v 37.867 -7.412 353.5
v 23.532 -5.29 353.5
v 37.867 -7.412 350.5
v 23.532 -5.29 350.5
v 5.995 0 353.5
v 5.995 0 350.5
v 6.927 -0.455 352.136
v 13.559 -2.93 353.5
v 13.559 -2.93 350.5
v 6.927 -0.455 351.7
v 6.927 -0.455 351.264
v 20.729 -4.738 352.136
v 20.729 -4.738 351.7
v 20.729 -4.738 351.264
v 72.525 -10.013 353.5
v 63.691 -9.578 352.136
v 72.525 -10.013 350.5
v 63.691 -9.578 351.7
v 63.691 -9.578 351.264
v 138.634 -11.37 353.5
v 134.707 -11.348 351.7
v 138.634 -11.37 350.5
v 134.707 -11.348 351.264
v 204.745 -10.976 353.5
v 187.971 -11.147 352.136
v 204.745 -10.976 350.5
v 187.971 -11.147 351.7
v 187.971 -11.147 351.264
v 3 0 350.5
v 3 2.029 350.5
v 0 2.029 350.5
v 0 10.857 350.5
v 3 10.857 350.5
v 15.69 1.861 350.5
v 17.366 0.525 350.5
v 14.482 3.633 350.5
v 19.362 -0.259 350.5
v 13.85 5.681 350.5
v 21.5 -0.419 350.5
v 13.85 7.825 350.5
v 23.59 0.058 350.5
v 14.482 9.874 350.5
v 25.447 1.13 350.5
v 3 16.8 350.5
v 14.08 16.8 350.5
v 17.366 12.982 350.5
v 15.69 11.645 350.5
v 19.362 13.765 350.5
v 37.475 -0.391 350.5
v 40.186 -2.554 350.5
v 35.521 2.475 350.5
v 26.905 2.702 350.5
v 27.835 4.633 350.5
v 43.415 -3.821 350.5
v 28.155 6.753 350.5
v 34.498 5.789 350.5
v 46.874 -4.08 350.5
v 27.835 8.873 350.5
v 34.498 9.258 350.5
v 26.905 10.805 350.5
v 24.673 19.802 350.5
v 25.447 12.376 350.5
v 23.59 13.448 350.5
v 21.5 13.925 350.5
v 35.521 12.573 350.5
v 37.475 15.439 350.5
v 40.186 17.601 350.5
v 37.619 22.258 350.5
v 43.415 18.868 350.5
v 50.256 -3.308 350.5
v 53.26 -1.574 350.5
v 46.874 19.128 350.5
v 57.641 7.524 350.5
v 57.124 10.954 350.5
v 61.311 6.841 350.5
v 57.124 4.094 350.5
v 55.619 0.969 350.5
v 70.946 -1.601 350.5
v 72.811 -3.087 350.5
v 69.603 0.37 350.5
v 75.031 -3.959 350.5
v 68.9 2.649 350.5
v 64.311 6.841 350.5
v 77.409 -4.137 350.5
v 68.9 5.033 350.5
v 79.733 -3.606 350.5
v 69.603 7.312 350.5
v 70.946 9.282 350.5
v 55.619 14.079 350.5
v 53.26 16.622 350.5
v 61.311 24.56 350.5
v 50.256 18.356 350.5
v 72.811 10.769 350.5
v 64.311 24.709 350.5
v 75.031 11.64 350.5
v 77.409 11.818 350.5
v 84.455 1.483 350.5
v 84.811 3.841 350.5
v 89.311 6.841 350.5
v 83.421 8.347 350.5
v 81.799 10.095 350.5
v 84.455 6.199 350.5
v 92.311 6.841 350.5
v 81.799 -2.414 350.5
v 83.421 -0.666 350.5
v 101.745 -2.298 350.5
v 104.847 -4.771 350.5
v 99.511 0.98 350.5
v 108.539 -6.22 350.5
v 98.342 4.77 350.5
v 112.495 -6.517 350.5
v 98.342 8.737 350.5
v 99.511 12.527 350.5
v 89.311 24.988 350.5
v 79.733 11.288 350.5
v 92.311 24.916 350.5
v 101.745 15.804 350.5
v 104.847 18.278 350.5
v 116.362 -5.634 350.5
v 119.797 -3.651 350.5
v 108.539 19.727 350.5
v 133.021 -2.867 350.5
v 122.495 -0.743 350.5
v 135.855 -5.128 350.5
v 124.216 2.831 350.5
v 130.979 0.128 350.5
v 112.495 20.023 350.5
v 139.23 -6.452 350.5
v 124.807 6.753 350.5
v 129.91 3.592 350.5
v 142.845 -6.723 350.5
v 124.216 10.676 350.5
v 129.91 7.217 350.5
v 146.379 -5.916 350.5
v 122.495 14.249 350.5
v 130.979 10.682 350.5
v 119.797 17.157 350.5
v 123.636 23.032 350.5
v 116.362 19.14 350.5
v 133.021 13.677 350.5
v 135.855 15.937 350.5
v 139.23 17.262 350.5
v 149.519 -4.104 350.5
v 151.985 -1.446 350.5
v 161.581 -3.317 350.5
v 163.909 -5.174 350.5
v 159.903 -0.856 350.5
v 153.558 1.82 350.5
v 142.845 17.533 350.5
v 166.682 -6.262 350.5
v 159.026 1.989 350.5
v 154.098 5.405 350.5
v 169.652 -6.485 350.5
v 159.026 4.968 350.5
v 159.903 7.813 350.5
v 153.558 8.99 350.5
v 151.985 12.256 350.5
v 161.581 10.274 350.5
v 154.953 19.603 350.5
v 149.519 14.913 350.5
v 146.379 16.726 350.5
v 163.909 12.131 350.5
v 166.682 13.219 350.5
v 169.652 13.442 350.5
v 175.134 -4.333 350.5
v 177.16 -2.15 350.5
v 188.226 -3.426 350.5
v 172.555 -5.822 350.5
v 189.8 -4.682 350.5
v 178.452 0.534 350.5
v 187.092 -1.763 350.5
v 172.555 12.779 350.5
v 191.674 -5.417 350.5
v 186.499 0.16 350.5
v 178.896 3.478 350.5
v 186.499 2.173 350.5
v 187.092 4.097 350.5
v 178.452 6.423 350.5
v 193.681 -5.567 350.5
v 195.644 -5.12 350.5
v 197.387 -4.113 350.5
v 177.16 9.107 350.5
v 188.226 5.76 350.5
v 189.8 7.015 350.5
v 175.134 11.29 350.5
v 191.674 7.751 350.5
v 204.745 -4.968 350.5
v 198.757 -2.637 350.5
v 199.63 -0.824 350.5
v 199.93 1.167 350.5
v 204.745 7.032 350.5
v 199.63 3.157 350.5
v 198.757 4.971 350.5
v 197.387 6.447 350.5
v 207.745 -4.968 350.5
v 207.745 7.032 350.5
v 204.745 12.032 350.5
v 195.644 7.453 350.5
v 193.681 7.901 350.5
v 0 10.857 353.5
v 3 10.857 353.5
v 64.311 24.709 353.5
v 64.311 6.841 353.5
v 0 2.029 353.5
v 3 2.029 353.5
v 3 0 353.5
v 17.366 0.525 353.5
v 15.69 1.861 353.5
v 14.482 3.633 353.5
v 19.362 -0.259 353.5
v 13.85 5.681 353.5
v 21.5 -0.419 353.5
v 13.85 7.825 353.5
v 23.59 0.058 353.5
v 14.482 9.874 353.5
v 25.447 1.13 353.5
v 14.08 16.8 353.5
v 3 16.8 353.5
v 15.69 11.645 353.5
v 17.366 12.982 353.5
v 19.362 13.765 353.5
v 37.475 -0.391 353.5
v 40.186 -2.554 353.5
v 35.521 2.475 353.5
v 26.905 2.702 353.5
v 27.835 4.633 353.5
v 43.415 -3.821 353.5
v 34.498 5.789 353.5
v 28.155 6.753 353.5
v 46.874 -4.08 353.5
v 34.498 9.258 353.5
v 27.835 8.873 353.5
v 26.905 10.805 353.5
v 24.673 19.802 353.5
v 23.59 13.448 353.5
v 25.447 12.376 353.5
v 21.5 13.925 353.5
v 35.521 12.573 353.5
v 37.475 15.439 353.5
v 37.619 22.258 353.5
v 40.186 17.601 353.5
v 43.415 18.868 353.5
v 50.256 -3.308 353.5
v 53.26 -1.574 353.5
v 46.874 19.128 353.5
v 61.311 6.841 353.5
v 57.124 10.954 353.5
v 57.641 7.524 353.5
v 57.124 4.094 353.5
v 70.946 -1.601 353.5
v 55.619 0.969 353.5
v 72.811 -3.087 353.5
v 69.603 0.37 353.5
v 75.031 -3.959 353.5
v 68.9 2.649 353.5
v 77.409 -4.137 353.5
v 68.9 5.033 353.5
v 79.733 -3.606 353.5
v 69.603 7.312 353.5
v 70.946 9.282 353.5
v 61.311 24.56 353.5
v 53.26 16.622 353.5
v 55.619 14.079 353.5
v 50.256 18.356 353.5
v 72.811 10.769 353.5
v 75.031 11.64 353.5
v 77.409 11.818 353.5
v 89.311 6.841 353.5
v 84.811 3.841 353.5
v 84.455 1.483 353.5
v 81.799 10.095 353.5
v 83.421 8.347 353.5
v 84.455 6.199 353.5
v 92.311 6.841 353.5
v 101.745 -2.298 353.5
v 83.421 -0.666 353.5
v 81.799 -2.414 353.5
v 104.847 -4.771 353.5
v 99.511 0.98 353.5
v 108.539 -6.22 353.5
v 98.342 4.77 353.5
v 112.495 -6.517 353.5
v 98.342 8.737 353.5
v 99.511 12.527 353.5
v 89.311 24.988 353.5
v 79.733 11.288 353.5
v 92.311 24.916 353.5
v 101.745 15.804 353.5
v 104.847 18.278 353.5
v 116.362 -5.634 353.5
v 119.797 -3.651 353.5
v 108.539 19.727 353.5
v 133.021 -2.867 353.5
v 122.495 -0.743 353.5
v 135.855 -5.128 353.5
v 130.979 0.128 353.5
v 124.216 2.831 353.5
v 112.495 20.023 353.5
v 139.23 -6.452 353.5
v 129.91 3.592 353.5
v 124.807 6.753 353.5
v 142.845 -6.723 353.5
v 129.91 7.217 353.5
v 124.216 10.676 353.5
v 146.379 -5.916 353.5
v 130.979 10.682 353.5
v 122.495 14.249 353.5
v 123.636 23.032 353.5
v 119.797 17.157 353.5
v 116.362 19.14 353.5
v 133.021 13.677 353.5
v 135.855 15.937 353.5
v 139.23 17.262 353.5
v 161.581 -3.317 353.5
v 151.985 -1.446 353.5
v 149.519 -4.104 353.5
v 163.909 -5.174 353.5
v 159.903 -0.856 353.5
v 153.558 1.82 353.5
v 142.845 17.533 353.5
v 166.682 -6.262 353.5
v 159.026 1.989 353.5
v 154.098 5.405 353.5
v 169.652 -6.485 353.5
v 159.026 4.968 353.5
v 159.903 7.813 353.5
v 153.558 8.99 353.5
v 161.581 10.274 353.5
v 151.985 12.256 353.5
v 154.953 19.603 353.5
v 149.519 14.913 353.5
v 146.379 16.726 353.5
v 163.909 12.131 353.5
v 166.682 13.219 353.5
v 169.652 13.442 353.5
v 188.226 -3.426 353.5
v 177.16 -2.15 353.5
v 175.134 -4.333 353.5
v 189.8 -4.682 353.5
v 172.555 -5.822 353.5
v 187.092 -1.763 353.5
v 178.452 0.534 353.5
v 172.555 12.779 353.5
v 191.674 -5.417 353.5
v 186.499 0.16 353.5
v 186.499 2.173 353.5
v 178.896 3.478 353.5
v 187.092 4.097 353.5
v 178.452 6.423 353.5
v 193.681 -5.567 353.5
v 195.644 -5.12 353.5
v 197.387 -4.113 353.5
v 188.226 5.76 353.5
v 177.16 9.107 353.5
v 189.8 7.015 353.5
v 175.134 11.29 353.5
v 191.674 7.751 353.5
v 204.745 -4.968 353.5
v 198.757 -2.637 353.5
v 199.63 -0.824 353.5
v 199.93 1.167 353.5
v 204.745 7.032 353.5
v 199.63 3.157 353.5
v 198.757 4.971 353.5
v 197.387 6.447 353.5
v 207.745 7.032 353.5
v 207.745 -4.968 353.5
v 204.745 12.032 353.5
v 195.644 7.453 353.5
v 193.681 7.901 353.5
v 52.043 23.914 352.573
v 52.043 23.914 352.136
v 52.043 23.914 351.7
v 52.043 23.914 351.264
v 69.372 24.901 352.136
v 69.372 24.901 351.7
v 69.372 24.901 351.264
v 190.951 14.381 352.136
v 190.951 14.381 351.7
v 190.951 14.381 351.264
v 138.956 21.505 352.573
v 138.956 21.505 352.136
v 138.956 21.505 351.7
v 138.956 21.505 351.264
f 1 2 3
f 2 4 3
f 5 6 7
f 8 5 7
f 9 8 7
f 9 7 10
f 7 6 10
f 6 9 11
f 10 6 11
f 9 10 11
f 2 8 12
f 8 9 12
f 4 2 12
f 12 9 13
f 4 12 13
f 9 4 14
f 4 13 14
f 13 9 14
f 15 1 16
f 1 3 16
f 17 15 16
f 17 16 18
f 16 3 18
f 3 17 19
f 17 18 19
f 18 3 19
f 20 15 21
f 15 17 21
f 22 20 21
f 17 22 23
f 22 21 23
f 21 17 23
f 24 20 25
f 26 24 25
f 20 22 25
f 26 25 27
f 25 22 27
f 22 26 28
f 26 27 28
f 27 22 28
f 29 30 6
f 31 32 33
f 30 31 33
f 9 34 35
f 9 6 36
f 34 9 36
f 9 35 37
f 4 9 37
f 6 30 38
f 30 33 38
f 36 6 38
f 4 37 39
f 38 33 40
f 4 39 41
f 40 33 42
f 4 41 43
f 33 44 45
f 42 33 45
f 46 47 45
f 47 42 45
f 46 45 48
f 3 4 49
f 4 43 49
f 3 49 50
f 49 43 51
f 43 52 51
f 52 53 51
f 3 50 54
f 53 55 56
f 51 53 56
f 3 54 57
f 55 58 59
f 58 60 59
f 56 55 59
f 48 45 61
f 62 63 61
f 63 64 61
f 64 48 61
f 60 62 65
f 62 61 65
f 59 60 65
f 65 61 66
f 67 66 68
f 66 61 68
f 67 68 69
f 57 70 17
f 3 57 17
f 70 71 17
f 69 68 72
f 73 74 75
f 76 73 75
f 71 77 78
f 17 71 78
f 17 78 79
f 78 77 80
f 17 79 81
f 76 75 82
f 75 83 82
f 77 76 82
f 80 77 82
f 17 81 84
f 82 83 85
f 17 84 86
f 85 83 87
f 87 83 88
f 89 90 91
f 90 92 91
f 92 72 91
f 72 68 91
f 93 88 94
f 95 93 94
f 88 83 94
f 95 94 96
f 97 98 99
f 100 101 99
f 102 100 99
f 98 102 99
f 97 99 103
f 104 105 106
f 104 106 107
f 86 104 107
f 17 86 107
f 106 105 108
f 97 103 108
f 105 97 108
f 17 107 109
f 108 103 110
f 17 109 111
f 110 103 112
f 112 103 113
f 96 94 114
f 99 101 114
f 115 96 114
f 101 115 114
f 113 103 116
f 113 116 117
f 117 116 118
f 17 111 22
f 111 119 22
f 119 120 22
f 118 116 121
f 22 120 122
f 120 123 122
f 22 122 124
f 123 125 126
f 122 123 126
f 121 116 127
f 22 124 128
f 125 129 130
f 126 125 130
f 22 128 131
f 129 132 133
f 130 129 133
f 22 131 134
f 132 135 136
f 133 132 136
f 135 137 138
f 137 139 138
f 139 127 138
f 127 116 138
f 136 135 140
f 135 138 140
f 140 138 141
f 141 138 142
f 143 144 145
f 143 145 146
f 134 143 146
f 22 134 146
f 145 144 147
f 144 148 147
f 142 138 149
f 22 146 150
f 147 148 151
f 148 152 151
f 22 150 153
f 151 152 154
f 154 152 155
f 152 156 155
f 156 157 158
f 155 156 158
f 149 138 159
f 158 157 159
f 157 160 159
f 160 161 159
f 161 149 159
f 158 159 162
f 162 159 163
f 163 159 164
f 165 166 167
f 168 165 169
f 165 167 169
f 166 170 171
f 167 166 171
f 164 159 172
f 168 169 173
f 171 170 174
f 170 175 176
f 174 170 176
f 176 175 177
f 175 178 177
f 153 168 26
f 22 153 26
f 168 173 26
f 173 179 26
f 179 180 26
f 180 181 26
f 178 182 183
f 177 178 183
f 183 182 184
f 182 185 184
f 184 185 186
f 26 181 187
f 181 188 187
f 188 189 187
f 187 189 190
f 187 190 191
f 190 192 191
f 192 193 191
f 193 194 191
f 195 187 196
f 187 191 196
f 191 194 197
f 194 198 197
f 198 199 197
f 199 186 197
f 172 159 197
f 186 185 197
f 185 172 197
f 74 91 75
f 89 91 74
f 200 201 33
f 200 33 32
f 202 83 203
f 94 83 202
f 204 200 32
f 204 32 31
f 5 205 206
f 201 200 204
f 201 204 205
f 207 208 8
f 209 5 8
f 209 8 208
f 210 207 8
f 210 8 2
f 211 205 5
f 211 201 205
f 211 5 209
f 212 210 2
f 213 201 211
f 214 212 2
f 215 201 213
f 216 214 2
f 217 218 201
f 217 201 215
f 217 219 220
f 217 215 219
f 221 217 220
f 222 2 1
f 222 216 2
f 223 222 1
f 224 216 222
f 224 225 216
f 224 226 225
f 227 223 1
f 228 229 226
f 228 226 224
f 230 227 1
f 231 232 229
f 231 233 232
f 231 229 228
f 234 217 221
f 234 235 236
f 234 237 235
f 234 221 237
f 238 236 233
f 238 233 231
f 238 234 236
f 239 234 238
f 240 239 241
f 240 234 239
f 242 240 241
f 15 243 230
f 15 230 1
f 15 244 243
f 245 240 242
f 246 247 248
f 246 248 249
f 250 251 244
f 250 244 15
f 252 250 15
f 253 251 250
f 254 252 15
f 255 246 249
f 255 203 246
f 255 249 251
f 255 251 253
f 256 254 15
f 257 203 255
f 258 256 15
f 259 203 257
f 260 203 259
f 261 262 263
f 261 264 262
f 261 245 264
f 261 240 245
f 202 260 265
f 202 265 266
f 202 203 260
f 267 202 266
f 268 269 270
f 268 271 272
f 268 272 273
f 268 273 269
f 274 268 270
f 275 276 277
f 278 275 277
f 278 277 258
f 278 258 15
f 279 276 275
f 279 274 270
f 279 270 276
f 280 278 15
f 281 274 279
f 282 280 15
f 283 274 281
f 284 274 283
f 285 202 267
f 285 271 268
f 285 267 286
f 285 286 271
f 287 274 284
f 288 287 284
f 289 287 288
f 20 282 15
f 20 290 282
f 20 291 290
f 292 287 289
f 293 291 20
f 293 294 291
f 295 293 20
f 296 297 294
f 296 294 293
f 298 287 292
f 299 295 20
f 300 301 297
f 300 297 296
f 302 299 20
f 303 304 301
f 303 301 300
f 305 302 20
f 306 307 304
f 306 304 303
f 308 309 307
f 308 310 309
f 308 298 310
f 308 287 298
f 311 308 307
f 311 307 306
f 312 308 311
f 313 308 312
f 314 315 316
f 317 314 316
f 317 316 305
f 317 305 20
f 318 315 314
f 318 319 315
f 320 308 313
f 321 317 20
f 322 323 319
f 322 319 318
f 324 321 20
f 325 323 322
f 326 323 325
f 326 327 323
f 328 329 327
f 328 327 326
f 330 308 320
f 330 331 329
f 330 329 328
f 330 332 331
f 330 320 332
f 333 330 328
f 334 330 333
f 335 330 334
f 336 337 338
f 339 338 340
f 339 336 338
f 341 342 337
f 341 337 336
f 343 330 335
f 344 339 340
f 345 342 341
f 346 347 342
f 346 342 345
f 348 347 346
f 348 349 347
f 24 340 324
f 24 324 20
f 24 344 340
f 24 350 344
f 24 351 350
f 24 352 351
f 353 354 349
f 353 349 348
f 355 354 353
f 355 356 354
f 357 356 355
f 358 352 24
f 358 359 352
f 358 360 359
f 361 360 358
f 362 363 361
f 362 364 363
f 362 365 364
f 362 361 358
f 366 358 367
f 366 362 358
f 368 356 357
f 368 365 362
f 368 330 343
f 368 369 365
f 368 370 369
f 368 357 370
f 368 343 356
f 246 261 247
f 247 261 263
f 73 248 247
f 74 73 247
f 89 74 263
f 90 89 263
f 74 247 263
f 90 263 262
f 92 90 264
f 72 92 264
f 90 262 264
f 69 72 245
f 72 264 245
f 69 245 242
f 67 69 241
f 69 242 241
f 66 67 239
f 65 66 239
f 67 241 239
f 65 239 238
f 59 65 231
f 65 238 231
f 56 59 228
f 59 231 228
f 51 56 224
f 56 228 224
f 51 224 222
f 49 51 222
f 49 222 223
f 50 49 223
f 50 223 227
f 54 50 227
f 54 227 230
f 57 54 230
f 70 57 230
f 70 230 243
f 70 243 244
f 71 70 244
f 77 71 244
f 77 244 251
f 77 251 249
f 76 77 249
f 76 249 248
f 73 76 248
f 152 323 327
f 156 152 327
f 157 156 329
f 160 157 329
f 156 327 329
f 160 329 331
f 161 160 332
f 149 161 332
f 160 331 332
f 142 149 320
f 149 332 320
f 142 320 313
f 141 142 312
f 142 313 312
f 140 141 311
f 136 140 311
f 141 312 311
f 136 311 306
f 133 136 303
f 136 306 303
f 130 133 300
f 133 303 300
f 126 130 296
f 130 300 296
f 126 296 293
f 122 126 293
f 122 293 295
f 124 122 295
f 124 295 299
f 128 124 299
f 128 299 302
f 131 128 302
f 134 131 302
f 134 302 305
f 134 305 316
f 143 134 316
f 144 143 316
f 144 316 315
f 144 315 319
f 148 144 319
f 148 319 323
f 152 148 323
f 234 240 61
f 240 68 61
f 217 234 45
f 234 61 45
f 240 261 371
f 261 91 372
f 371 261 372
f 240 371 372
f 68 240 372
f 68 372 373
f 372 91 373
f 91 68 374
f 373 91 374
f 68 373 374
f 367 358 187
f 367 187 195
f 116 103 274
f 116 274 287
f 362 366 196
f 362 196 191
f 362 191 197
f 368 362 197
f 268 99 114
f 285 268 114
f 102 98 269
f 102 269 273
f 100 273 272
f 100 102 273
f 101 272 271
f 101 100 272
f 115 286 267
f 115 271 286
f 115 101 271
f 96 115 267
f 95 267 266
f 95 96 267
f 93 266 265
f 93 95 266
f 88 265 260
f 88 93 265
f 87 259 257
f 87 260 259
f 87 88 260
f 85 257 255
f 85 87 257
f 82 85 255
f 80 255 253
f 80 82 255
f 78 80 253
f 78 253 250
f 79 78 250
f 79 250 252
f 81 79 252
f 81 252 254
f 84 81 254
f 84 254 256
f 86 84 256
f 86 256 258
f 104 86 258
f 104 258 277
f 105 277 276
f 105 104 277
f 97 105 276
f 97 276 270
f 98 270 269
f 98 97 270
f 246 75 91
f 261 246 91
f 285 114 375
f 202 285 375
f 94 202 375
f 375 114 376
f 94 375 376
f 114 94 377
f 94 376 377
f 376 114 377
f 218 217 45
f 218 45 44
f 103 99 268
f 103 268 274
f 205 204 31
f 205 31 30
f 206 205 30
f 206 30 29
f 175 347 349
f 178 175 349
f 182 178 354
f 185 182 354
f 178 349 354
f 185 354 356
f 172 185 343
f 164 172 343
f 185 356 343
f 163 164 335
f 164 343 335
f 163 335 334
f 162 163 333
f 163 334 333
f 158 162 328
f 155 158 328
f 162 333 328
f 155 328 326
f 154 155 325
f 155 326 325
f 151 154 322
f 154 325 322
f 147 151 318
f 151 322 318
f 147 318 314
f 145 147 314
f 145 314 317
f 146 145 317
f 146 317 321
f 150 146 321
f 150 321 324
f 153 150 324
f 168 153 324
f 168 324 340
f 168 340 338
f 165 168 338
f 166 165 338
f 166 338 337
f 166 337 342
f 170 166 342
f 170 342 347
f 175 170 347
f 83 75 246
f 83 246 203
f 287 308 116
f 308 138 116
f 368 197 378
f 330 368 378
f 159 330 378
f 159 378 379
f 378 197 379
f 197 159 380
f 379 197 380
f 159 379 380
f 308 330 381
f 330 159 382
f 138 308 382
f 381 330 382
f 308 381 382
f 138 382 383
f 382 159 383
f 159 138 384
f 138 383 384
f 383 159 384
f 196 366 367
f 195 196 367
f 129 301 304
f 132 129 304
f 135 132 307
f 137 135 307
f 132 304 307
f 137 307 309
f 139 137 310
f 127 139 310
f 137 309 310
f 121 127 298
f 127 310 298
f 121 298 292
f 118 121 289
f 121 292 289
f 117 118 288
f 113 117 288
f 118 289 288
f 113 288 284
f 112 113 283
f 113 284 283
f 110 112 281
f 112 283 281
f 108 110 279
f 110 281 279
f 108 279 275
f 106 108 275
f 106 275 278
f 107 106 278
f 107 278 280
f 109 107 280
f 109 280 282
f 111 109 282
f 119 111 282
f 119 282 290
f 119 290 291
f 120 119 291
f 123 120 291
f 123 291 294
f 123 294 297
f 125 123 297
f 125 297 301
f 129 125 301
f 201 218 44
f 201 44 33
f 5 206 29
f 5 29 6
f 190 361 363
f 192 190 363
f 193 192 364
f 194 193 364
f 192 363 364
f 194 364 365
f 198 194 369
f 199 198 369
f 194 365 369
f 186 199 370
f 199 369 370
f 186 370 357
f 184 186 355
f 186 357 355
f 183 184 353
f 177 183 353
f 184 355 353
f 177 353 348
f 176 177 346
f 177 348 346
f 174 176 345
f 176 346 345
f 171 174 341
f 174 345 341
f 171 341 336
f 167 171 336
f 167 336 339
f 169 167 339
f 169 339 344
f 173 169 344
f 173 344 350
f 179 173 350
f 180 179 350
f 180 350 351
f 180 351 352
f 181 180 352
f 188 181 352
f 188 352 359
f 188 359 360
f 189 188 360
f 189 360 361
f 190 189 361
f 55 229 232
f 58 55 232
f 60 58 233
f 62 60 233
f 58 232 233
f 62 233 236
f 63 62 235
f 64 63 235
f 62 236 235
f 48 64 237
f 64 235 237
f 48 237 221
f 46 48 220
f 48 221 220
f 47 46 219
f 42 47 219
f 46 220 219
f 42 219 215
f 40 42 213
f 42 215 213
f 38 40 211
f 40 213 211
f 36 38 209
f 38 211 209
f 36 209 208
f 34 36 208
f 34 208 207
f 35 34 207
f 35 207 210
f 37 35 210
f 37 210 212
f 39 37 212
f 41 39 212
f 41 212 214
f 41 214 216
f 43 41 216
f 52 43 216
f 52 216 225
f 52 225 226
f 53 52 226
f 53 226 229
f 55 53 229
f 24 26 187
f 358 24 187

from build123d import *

# Parameters (mm, degrees)
STOCK_WING_STRUCTURESIZING_1_START = 350.5
STOCK_WING_STRUCTURESIZING_1_DEPTH = 3
CUT_EXTRUDE2_DEPTH                 = 278.894871602
CUT_EXTRUDE2_DEPTH_BACK            = 278.894871602
SKETCH3_R                          = 8
SKETCH3_W                          = 3
SKETCH3_H                          = 18.234468085
CUT_EXTRUDE5_DEPTH                 = 278.894871602
CUT_EXTRUDE5_DEPTH_BACK            = 278.894871602
SKETCH6_W                          = 72
SKETCH6_H                          = 36.832163157
SKETCH7_W                          = 3
SKETCH7_H                          = 29.829109924
CUT_EXTRUDE6_DEPTH                 = 3
BOSS_EXTRUDE1_DEPTH                = 3
SKETCH9_R                          = 7.192226029
SKETCH9_R_2                        = 11.636406179
SKETCH9_R_3                        = 13.307061318
SKETCH9_R_4                        = 12.161876466
SKETCH9_R_5                        = 9.990979792
SKETCH9_R_6                        = 6.753270012
CUT_EXTRUDE7_DEPTH                 = 10


# Read off the part's stored shape, not the designer's step: Stock-Wing_structureSizing-1
with BuildPart() as part:
    # Stock-Wing_structureSizing-1 outline → Stock-Wing_structureSizing-1 (new body)
    with BuildSketch(Plane.XY.offset(STOCK_WING_STRUCTURESIZING_1_START)):
        with BuildLine():
            Line((276.744987748, -9.975467242), (276.744987748, -2.791972149))
            add(Edge.make_bspline(
                [(276.744987748, -2.791972149), (265.3857023, -0.102525952), (253.985388892, 2.407220527), (231.123115134, 7.137179769), (219.66894224, 9.35664169), (202.450532833, 12.449607831), (196.704666185, 13.440005467), (185.197495984, 15.322846112), (179.436018194, 16.214183509), (167.896810084, 17.893728146), (162.119320772, 18.683464695), (150.549559093, 20.169132171), (144.757676972, 20.867539393), (133.154760401, 22.142823058), (127.340720117, 22.719276226), (115.726117513, 23.709424358), (109.921864102, 24.123286294), (92.520744809, 25.054695045), (80.935765142, 25.255529424), (63.589579679, 24.723206588), (57.812696472, 24.40777964), (49.15741104, 23.667136334), (46.27396258, 23.376378774), (40.511150261, 22.68602794), (37.631848569, 22.284778258), (31.878918329, 21.331115885), (29.005409213, 20.775520933), (24.699904445, 19.815325722), (23.265457389, 19.476044022), (20.398415094, 18.74813831), (18.963740816, 18.357002163), (16.106748162, 17.497000764), (14.692710081, 17.03099603), (11.902486035, 16.004726933), (10.526189891, 15.444736939), (8.50012674, 14.509175123), (7.830361802, 14.183402304), (6.512563898, 13.477739544), (5.865248411, 13.093583044), (4.633392785, 12.255605476), (4.045066641, 11.801499914), (3.209118512, 11.061128735), (2.938431583, 10.804207958), (2.416562808, 10.265550671), (2.165207772, 9.983507914), (1.696102707, 9.397220013), (1.477442994, 9.09171798), (1.085439515, 8.447078561), (0.915512906, 8.113897404), (0.714798114, 7.59155933), (0.657190766, 7.413573783), (0.566275814, 7.047480769), (0.533643429, 6.859526942), (0.498702003, 6.485823786), (0.495732967, 6.298500114), (0.52230969, 5.922794269), (0.553180601, 5.733657444), (0.641956646, 5.367254731), (0.699629973, 5.188174612), (0.835770495, 4.836464845), (0.914681224, 4.663114785), (1.173802922, 4.160517642), (1.376431151, 3.845824341), (1.822835658, 3.244491079), (2.068245893, 2.956719217), (2.585349641, 2.410512622), (2.856205808, 2.152934366), (3.699269455, 1.418677094), (4.302923323, 0.981675809), (5.262649419, 0.394618321), (5.591648375, 0.21018796), (6.254696782, -0.135942129), (6.589931521, -0.298692503), (7.602521133, -0.767803382), (8.28593821, -1.057311971), (9.662885491, -1.60821635), (10.357226689, -1.867357708), (12.455074514, -2.603572901), (13.873250521, -3.039868309), (16.739197416, -3.830190303), (18.188973825, -4.184254143), (22.54237297, -5.143962802), (25.459339583, -5.655261329), (31.306270814, -6.564233952), (34.235701619, -6.966574468), (40.104165427, -7.687316125), (43.043386977, -8.004069053), (51.874086741, -8.840379009), (57.778366073, -9.248032718), (66.64804678, -9.743583642), (69.60756187, -9.887823594), (75.525585547, -10.141245843), (78.484610817, -10.250077692), (84.402679828, -10.443151081), (87.361723417, -10.527595381), (93.279819329, -10.684856962), (96.238871496, -10.7578835), (111.034153794, -11.094438823), (122.870449548, -11.270610432), (140.625005024, -11.385979432), (146.54320834, -11.400264082), (158.379650661, -11.381324799), (164.297889136, -11.348805922), (176.134384089, -11.259801078), (182.052639742, -11.204415721), (193.889154401, -11.089178887), (199.807414258, -11.02819544), (217.562198328, -10.839257795), (229.398721047, -10.713290888), (253.0718283, -10.379069852), (264.908412973, -10.164021277), (276.744987748, -9.975467242)],
                knots=[0, 0, 0, 0, 0.0625, 0.0625, 0.125, 0.125, 0.15625, 0.15625, 0.1875, 0.1875, 0.21875, 0.21875, 0.25, 0.25, 0.28125, 0.28125, 0.3125, 0.3125, 0.375, 0.375, 0.40625, 0.40625, 0.421875, 0.421875, 0.4375, 0.4375, 0.453125, 0.453125, 0.4609375, 0.4609375, 0.46875, 0.46875, 0.4765625, 0.4765625, 0.484375, 0.484375, 0.48828125, 0.48828125, 0.4921875, 0.4921875, 0.49609375, 0.49609375, 0.498046875, 0.498046875, 0.5, 0.5, 0.501953125, 0.501953125, 0.50390625, 0.50390625, 0.504882813, 0.504882813, 0.505859375, 0.505859375, 0.506835938, 0.506835938, 0.5078125, 0.5078125, 0.508789063, 0.508789063, 0.509765625, 0.509765625, 0.51171875, 0.51171875, 0.513671875, 0.513671875, 0.515625, 0.515625, 0.51953125, 0.51953125, 0.521484375, 0.521484375, 0.5234375, 0.5234375, 0.52734375, 0.52734375, 0.53125, 0.53125, 0.5390625, 0.5390625, 0.546875, 0.546875, 0.5625, 0.5625, 0.578125, 0.578125, 0.59375, 0.59375, 0.625, 0.625, 0.640625, 0.640625, 0.65625, 0.65625, 0.671875, 0.671875, 0.6875, 0.6875, 0.75, 0.75, 0.78125, 0.78125, 0.8125, 0.8125, 0.84375, 0.84375, 0.875, 0.875, 0.9375, 0.9375, 1, 1, 1, 1], degree=3))
        make_face()
    extrude(amount=STOCK_WING_STRUCTURESIZING_1_DEPTH)

    # Sketch3 → Cut-Extrude2 (cut, two sides: drawn at the far end of the back side and taken through both)
    with BuildSketch(Plane.XY.offset(353.5).offset(-CUT_EXTRUDE2_DEPTH_BACK)):
        with Locations((76.810751166, 3.840845639)):
            Circle(SKETCH3_R)
        with Locations((62.810751166, 15.958079682)):
            Rectangle(SKETCH3_W, SKETCH3_H)
        with Locations((90.810751166, 15.958079682)):
            Rectangle(SKETCH3_W, SKETCH3_H)
    extrude(amount=CUT_EXTRUDE2_DEPTH + CUT_EXTRUDE2_DEPTH_BACK, mode=Mode.SUBTRACT)

    # Sketch6 → Cut-Extrude5 (cut, two sides: drawn at the far end of the back side and taken through both)
    with BuildSketch(Plane.XY.offset(353.5).offset(-CUT_EXTRUDE5_DEPTH_BACK)):
        with Locations((240.744987748, -6.383719695)):
            Rectangle(SKETCH6_W, SKETCH6_H)
    extrude(amount=CUT_EXTRUDE5_DEPTH + CUT_EXTRUDE5_DEPTH_BACK, mode=Mode.SUBTRACT)

    # Sketch7 → Cut-Extrude6 (cut)
    with BuildSketch(Plane.XY.offset(353.5)):
        with Locations((1.5, 14.914554962)):
            Rectangle(SKETCH7_W, SKETCH7_H)
    extrude(amount=-CUT_EXTRUDE6_DEPTH, mode=Mode.SUBTRACT)

    # Sketch8 → Boss-Extrude1 (add)
    with BuildSketch(Plane.XY.offset(353.5)):
        Polygon((14.079741692, 16.8), (3, 16.8), (3, 10.856999155), (0, 10.856999155), (0, 2.029447684), (3, 2.029447684), (3, 0), (5.994622402, 0), align=None)
        Polygon((204.744998472, 7.032361884), (207.744998472, 7.032361884), (207.744998472, -4.967638116), (204.744998472, -4.967638116), (202.527550965, -4.967638116), (202.527550965, 7.032361884), align=None)
    extrude(amount=-BOSS_EXTRUDE1_DEPTH)

    # Sketch9 → Cut-Extrude7 (cut)
    with BuildSketch(Plane.XY.offset(353.5)):
        with Locations((20.96232931, 6.753270012)):
            Circle(SKETCH9_R)
        with Locations((46.004691522, 7.523804234)):
            Circle(SKETCH9_R_2)
        with Locations((111.500100385, 6.753270012)):
            Circle(SKETCH9_R_3)
        with Locations((141.93620215, 5.404835124)):
            Circle(SKETCH9_R_4)
        with Locations((168.904899918, 3.478499569)):
            Circle(SKETCH9_R_5)
        with Locations((193.176727908, 1.166896903)):
            Circle(SKETCH9_R_6)
    extrude(amount=-CUT_EXTRUDE7_DEPTH, mode=Mode.SUBTRACT)


solid = part.part
